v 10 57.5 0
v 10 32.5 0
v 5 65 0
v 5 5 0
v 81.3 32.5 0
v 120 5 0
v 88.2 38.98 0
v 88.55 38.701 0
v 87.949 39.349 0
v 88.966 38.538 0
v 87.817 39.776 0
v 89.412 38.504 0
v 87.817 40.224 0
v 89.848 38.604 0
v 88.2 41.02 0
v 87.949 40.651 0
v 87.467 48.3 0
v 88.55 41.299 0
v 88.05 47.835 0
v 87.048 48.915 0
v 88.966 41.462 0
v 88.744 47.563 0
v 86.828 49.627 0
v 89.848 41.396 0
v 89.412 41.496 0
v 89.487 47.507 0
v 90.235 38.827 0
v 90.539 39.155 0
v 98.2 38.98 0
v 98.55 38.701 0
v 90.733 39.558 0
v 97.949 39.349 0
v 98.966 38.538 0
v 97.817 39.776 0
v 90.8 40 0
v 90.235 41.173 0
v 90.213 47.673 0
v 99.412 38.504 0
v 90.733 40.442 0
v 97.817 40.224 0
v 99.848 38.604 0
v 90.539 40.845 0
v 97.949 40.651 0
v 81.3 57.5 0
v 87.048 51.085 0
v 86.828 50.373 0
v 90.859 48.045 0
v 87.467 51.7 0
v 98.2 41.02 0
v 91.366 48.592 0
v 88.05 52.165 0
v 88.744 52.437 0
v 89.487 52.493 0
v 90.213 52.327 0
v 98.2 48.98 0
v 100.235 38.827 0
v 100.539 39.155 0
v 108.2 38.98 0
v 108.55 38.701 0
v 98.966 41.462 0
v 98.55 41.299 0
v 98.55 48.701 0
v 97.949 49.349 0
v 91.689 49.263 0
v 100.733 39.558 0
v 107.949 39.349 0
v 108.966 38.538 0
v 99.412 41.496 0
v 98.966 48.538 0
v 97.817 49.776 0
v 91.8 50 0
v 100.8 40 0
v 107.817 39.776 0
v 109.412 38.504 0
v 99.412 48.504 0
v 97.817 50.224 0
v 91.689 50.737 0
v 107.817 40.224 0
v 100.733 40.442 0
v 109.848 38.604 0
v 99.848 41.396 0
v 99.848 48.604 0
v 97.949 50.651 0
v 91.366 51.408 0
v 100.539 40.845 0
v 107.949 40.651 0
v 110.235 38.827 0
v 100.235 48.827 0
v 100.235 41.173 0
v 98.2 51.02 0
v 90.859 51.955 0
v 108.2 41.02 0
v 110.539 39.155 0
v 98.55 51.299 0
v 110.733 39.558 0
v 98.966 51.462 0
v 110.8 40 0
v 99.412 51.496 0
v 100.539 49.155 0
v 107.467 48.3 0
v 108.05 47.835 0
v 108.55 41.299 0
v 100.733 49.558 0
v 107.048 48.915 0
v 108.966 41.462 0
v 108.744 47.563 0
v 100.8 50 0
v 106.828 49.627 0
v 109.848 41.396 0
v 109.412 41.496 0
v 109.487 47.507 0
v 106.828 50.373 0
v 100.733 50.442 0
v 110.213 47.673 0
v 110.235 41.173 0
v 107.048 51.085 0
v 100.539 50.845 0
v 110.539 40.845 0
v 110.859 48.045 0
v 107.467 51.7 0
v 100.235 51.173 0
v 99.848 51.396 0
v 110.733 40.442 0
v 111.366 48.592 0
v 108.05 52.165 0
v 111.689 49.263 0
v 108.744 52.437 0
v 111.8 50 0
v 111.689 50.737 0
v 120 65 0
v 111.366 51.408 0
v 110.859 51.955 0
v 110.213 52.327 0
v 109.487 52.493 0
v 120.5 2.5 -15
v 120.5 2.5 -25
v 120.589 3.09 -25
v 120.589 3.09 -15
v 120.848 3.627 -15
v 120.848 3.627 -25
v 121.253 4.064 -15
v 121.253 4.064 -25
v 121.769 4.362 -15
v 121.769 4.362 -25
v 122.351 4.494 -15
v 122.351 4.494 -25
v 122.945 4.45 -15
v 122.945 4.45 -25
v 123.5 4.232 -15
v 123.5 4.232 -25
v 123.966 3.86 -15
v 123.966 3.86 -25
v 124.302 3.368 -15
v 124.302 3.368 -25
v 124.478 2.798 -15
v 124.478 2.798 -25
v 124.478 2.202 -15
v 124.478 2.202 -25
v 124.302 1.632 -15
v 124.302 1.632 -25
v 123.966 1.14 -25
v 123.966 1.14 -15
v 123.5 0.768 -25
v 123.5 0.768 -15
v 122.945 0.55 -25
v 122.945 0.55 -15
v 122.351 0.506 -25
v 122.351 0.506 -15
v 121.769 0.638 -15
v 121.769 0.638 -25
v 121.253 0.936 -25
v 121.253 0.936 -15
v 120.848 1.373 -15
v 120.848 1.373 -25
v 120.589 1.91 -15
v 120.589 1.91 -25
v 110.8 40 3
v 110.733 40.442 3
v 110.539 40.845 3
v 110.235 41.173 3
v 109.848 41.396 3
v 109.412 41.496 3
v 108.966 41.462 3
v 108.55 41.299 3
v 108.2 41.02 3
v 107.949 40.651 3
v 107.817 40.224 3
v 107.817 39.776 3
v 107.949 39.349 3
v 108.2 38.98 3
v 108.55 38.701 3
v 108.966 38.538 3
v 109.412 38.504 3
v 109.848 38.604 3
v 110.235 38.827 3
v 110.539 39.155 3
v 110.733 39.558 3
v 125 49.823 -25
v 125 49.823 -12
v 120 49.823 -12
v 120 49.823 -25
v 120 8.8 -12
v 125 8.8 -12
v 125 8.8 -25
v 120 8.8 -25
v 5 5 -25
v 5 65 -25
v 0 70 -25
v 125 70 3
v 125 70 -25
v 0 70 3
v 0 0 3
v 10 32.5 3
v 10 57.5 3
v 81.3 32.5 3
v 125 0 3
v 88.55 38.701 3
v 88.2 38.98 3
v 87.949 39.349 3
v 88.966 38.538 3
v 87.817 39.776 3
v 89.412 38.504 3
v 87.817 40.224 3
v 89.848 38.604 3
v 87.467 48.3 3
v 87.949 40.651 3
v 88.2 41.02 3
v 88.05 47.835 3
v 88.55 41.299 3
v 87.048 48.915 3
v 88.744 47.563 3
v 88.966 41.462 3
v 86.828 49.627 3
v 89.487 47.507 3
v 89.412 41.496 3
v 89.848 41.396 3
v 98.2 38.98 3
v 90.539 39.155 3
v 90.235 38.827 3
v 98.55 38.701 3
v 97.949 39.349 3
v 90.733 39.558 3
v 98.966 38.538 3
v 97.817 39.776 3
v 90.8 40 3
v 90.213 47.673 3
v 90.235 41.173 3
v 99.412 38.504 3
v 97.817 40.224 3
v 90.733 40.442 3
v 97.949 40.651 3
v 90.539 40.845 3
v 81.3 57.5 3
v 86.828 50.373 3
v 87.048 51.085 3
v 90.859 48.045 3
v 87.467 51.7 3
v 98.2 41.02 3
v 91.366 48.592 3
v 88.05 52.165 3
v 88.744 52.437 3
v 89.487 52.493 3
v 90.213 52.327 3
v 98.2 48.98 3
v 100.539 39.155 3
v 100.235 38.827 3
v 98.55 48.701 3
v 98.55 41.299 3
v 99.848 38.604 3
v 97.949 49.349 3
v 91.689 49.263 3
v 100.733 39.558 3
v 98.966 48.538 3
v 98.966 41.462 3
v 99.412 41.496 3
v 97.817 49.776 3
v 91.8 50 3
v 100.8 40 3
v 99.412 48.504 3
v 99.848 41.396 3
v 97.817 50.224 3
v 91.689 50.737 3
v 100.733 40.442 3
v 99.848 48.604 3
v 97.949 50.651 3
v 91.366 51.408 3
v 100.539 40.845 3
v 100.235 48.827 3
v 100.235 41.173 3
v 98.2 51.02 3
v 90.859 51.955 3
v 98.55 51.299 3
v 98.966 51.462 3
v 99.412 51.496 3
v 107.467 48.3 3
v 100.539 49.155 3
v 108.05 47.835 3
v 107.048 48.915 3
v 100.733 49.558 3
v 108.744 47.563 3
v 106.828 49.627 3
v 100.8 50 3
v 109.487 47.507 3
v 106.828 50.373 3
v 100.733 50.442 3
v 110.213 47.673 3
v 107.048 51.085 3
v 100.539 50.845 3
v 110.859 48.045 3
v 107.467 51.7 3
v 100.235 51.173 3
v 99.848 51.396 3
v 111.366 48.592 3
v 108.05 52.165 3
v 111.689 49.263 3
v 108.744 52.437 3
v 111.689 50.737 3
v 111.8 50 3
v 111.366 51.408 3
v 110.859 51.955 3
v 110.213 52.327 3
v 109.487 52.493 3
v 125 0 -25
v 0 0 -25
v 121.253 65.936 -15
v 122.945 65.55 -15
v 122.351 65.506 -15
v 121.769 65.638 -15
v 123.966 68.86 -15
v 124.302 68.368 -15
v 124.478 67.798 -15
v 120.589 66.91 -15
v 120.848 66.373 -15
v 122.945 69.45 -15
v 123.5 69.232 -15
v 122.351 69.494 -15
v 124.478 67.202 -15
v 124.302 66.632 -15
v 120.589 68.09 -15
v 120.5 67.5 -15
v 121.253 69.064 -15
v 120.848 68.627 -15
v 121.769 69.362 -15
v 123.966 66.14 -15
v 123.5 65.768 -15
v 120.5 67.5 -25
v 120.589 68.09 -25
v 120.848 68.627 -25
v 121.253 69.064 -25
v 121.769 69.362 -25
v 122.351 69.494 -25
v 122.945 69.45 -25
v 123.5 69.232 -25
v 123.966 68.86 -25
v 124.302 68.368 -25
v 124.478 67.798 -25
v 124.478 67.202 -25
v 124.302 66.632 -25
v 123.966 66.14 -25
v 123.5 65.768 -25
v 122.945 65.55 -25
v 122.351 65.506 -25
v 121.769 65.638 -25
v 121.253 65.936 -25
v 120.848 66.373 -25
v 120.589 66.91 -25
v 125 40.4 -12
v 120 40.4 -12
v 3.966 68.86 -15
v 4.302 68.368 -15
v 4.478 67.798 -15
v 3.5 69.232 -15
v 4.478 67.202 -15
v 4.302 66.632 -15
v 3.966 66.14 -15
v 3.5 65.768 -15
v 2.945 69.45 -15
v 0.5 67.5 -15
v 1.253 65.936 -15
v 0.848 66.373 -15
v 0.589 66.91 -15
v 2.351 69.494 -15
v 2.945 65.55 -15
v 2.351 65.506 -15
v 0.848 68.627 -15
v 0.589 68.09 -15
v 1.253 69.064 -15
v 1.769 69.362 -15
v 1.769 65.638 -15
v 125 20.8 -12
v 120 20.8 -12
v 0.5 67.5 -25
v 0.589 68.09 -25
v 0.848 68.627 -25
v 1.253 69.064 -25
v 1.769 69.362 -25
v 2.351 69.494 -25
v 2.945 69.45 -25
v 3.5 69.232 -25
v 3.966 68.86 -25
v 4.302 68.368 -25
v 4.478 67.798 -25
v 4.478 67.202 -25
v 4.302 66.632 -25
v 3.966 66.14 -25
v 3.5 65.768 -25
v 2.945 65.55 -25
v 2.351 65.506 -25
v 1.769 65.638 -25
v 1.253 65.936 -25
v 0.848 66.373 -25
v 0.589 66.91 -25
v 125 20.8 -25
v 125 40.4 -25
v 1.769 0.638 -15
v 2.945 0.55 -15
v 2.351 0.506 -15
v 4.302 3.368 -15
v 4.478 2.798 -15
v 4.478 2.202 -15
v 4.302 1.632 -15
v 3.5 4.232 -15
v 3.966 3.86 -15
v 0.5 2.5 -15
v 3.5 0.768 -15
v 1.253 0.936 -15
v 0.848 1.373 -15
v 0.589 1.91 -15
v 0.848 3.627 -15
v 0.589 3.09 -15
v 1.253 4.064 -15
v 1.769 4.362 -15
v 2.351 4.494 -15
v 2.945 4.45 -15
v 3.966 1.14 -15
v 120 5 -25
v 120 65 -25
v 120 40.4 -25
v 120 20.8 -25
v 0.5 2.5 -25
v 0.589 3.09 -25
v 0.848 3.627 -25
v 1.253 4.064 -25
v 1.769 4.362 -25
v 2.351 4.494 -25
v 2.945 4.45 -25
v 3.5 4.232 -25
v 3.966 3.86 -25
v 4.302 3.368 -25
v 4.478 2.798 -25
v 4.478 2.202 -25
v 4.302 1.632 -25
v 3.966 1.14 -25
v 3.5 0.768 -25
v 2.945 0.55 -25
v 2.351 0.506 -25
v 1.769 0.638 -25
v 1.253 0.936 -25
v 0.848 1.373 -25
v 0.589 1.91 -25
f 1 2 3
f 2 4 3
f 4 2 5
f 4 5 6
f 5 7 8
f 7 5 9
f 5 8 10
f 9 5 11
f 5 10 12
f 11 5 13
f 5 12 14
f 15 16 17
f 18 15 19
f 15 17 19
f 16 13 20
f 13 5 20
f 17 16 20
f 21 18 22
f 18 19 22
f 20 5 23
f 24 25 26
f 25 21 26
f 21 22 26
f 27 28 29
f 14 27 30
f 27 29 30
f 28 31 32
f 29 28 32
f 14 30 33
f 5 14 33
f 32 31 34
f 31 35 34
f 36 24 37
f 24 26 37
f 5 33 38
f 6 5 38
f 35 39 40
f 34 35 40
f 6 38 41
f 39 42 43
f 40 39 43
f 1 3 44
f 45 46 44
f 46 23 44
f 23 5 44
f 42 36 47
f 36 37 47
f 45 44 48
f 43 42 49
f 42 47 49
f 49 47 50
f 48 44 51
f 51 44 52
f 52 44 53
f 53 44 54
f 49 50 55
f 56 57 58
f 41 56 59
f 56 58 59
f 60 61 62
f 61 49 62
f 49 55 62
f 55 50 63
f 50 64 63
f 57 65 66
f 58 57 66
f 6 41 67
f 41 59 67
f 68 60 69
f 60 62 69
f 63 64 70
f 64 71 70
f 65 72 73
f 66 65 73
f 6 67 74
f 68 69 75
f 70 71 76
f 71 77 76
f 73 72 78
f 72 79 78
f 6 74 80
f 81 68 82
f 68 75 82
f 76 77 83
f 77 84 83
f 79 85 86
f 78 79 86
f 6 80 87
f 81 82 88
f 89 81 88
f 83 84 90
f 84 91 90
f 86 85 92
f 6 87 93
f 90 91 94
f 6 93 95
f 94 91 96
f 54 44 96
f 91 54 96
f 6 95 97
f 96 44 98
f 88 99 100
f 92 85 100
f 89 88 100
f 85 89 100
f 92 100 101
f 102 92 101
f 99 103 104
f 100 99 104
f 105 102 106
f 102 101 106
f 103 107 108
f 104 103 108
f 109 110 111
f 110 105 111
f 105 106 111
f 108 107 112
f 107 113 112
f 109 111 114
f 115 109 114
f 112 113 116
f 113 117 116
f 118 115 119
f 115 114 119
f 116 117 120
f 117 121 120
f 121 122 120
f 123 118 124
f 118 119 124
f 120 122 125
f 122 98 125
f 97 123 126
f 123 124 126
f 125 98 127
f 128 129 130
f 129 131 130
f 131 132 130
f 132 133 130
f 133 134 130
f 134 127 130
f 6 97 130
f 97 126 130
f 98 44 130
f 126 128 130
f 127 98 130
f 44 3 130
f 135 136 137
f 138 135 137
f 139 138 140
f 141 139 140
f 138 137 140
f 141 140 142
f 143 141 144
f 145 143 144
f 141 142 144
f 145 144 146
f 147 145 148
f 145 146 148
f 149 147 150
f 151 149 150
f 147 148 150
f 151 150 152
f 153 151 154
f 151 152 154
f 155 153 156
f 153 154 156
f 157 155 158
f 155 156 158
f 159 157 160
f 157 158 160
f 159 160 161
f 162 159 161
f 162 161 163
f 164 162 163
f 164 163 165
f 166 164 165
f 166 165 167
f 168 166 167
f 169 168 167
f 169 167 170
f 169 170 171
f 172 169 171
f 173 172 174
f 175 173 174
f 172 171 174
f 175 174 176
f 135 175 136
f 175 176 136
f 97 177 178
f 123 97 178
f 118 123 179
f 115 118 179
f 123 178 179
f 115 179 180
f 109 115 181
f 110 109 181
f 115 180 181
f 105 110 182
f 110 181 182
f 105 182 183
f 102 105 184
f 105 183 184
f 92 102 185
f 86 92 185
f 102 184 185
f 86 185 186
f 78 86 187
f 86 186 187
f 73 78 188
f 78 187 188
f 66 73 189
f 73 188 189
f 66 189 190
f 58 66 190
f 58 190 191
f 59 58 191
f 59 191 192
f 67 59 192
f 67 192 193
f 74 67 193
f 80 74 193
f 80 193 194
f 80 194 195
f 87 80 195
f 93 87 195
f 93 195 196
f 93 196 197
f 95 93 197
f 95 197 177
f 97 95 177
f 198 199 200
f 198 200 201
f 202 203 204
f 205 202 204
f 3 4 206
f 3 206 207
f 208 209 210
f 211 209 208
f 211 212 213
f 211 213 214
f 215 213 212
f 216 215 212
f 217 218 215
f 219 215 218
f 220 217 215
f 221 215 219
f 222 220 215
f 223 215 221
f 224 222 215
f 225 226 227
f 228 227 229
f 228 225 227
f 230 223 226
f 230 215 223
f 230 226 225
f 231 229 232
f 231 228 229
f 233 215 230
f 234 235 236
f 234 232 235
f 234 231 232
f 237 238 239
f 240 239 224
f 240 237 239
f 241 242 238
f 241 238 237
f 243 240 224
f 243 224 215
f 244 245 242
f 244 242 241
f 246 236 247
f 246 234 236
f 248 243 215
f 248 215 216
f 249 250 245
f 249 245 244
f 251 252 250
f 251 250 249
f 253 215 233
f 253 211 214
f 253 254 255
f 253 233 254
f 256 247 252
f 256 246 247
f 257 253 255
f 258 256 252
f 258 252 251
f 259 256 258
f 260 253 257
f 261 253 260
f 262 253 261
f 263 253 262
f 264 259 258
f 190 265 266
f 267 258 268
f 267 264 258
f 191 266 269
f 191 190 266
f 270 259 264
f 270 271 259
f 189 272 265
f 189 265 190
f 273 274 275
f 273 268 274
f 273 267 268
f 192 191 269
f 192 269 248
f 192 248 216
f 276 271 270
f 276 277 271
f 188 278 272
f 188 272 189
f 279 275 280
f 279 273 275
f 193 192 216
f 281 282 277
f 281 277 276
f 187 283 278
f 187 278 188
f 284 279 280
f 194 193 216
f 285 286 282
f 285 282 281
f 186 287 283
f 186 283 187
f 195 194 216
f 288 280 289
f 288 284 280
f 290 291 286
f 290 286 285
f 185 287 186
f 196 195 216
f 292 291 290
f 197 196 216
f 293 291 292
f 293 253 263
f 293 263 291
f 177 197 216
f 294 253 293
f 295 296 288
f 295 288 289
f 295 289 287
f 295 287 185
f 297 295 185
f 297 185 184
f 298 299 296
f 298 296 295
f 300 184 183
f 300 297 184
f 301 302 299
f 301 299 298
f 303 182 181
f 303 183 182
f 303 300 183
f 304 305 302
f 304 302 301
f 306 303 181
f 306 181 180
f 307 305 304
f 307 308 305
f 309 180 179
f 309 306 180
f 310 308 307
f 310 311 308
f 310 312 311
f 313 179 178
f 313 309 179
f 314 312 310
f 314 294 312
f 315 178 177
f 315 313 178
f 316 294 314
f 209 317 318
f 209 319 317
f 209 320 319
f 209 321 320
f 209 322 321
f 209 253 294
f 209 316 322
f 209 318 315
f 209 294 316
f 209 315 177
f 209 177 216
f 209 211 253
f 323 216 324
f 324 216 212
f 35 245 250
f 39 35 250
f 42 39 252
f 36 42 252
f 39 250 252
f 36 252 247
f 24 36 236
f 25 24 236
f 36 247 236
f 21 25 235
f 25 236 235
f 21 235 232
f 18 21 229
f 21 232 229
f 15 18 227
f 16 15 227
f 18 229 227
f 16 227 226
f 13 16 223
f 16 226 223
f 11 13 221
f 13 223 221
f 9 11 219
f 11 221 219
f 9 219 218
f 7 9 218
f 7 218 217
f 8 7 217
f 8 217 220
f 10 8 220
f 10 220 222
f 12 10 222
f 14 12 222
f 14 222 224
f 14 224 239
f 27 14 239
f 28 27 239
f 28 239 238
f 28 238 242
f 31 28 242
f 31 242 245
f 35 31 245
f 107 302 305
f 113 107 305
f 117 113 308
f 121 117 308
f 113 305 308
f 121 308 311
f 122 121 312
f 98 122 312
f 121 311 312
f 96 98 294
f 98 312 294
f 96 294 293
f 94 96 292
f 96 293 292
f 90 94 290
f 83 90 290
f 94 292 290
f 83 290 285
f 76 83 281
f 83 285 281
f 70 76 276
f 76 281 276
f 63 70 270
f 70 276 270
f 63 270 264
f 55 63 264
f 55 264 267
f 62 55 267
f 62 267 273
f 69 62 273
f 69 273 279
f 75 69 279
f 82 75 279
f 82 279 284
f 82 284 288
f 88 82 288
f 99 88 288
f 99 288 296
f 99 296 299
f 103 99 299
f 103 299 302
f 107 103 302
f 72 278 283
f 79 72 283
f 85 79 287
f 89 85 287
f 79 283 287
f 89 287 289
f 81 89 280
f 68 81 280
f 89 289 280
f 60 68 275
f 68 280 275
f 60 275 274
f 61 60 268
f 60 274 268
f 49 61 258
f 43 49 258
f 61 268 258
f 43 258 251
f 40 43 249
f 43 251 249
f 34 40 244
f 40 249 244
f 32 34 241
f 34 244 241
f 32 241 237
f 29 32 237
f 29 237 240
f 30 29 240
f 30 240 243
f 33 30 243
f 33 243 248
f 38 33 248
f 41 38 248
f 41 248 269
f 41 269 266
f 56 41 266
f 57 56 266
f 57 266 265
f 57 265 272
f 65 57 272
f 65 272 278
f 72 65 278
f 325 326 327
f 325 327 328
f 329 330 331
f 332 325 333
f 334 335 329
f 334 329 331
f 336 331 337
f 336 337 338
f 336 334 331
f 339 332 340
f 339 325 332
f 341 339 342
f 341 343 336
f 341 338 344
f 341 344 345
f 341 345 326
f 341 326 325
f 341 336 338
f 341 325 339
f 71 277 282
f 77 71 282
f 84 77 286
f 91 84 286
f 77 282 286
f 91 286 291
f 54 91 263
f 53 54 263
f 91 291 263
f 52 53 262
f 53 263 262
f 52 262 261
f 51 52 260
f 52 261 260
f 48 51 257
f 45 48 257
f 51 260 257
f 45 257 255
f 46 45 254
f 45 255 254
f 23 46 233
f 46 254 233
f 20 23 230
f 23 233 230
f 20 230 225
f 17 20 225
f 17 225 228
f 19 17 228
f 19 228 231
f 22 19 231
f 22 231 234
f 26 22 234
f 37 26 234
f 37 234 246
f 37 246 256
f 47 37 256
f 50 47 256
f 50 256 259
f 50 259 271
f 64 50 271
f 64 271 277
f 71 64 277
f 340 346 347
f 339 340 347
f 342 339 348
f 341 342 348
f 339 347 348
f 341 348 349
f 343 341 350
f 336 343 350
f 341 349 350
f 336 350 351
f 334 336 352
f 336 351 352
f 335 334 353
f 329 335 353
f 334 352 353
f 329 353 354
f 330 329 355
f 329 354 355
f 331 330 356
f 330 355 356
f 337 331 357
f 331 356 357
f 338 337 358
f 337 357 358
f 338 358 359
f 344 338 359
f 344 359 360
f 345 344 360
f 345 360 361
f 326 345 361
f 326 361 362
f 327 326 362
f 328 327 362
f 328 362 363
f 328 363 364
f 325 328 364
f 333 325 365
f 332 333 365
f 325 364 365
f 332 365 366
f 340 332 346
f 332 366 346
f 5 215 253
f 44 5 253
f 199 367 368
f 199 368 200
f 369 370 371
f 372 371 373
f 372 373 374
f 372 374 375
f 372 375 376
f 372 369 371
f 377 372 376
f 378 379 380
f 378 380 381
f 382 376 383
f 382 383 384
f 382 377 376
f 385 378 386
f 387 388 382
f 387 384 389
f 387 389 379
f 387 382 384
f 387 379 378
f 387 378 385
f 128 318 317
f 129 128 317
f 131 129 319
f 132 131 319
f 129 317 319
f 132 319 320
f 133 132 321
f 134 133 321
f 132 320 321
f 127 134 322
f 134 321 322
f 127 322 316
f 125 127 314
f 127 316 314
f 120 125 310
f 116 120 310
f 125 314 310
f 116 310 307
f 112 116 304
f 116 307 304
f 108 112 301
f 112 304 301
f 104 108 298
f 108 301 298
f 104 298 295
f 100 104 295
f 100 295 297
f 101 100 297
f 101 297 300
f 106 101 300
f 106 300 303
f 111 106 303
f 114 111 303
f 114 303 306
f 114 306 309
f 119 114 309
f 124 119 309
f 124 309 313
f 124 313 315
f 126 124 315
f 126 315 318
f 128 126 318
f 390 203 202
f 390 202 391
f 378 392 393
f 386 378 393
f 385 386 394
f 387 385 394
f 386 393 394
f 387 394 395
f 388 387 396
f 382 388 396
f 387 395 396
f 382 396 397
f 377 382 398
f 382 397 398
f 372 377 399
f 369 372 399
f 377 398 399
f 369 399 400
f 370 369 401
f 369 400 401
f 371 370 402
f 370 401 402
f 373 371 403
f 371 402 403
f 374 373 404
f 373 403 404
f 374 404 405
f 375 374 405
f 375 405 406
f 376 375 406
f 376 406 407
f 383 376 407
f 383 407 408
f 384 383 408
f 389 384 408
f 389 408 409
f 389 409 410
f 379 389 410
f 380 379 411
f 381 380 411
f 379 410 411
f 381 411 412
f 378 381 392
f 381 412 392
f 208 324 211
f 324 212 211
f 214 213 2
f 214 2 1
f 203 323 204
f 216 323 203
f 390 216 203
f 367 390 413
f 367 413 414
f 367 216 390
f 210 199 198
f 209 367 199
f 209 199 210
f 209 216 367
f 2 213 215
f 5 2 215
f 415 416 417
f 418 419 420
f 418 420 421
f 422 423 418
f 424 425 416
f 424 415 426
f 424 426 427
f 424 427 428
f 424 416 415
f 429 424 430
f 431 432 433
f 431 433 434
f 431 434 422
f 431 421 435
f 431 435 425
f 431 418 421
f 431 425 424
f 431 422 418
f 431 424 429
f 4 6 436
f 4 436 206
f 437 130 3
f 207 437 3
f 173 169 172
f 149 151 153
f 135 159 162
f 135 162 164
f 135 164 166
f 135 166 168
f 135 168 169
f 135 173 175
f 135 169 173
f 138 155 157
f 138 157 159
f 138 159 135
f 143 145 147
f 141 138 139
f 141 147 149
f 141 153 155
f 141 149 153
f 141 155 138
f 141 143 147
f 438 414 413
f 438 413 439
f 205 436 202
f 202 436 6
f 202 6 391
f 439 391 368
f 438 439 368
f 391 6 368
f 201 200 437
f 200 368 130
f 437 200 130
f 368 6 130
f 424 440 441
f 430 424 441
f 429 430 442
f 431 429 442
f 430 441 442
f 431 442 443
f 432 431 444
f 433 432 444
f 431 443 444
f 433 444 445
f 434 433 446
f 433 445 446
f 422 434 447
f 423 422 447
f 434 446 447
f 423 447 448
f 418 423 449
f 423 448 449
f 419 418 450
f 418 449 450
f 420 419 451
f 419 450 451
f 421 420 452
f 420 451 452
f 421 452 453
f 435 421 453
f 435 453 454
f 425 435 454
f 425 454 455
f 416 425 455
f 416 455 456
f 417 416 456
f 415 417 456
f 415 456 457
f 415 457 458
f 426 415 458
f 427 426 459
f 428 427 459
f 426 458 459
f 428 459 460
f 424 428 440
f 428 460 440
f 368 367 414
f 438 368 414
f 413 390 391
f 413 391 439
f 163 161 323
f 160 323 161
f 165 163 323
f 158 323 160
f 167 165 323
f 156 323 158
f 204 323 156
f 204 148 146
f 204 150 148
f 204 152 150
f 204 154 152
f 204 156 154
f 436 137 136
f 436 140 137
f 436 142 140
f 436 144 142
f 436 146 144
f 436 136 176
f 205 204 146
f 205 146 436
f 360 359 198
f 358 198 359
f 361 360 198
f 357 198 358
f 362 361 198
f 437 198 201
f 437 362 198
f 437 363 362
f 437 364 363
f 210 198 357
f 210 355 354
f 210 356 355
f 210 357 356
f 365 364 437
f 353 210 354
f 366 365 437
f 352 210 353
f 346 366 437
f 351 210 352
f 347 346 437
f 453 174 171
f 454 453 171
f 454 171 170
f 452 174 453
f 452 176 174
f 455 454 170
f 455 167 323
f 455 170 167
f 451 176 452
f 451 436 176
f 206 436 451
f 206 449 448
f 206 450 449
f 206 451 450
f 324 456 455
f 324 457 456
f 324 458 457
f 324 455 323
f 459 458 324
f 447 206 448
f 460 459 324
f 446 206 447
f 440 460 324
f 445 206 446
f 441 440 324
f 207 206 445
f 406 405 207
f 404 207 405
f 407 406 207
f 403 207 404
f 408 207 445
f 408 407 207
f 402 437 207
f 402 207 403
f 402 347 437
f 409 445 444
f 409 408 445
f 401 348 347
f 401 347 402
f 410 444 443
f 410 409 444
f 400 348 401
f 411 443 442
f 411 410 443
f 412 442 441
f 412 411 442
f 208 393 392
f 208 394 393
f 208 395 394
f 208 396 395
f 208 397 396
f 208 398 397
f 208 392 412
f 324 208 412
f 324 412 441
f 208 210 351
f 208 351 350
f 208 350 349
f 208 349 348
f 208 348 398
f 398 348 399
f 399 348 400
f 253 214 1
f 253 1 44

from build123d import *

# Parameters (mm, degrees)
SKETCH1_W           = 125
SKETCH1_H           = 70
BOSS_EXTRUDE1_DEPTH = 3
SKETCH2_W           = 71.3
SKETCH2_H           = 25
CUT_EXTRUDE1_DEPTH  = 5
SKETCH4_R           = 2.5
SKETCH4_R_2         = 1.5
CUT_EXTRUDE2_DEPTH  = 5
SKETCH5_W           = 125
SKETCH5_H           = 70
SKETCH5_W_2         = 115
SKETCH5_H_2         = 60
BOSS_EXTRUDE2_DEPTH = 25
SKETCH6_R           = 2
CUT_EXTRUDE3_DEPTH  = 10
SKETCH7_W           = 13
SKETCH7_H           = 12
SKETCH7_H_2         = 9.422573881
CUT_EXTRUDE4_DEPTH  = 10


with BuildPart() as part:
    # Sketch1 → Boss-Extrude1 (new body)
    with BuildSketch(Plane.XY):
        with Locations((62.5, 35)):
            Rectangle(SKETCH1_W, SKETCH1_H)
    extrude(amount=BOSS_EXTRUDE1_DEPTH)

    # Sketch2 → Cut-Extrude1 (cut)
    with BuildSketch(Plane.XY.offset(3)):
        with Locations((45.65, 45)):
            Rectangle(SKETCH2_W, SKETCH2_H)
    extrude(amount=-CUT_EXTRUDE1_DEPTH, mode=Mode.SUBTRACT)

    # Sketch4 → Cut-Extrude2 (cut)
    with BuildSketch(Plane.XY.offset(3)):
        with Locations((89.3, 50)):
            Circle(SKETCH4_R)
        with Locations((99.3, 50)):
            Circle(SKETCH4_R_2)
        with Locations((109.3, 50)):
            Circle(SKETCH4_R)
        with Locations((89.3, 40)):
            Circle(SKETCH4_R_2)
        with Locations((99.3, 40)):
            Circle(SKETCH4_R_2)
        with Locations((109.3, 40)):
            Circle(SKETCH4_R_2)
    extrude(amount=-CUT_EXTRUDE2_DEPTH, mode=Mode.SUBTRACT)

    # Sketch5 → Boss-Extrude2 (add)
    with BuildSketch(Plane(origin=(0, 0, 0), x_dir=(-1, 0, 0), z_dir=(0, 0, -1))):
        with Locations((-62.5, 35)):
            Rectangle(SKETCH5_W, SKETCH5_H)
        with Locations((-62.5, 35)):
            Rectangle(SKETCH5_W_2, SKETCH5_H_2, mode=Mode.SUBTRACT)
    extrude(amount=BOSS_EXTRUDE2_DEPTH)

    # Sketch6 → Cut-Extrude3 (cut)
    with BuildSketch(Plane(origin=(0, 0, -25), x_dir=(-1, 0, 0), z_dir=(0, 0, -1))):
        with Locations((-122.5, 67.5)):
            Circle(SKETCH6_R)
        with Locations((-2.5, 67.5)):
            Circle(SKETCH6_R)
        with Locations((-2.5, 2.5)):
            Circle(SKETCH6_R)
        with Locations((-122.5, 2.5)):
            Circle(SKETCH6_R)
    extrude(amount=-CUT_EXTRUDE3_DEPTH, mode=Mode.SUBTRACT)

    # Sketch7 → Cut-Extrude4 (cut)
    with BuildSketch(Plane(origin=(125, 0, 0), x_dir=(0, 0, -1), z_dir=(1, 0, 0))):
        with Locations((18.5, 14.8)):
            Rectangle(SKETCH7_W, SKETCH7_H)
        with Locations((18.5, 45.111286941)):
            Rectangle(SKETCH7_W, SKETCH7_H_2)
    extrude(amount=-CUT_EXTRUDE4_DEPTH, mode=Mode.SUBTRACT)


solid = part.part
